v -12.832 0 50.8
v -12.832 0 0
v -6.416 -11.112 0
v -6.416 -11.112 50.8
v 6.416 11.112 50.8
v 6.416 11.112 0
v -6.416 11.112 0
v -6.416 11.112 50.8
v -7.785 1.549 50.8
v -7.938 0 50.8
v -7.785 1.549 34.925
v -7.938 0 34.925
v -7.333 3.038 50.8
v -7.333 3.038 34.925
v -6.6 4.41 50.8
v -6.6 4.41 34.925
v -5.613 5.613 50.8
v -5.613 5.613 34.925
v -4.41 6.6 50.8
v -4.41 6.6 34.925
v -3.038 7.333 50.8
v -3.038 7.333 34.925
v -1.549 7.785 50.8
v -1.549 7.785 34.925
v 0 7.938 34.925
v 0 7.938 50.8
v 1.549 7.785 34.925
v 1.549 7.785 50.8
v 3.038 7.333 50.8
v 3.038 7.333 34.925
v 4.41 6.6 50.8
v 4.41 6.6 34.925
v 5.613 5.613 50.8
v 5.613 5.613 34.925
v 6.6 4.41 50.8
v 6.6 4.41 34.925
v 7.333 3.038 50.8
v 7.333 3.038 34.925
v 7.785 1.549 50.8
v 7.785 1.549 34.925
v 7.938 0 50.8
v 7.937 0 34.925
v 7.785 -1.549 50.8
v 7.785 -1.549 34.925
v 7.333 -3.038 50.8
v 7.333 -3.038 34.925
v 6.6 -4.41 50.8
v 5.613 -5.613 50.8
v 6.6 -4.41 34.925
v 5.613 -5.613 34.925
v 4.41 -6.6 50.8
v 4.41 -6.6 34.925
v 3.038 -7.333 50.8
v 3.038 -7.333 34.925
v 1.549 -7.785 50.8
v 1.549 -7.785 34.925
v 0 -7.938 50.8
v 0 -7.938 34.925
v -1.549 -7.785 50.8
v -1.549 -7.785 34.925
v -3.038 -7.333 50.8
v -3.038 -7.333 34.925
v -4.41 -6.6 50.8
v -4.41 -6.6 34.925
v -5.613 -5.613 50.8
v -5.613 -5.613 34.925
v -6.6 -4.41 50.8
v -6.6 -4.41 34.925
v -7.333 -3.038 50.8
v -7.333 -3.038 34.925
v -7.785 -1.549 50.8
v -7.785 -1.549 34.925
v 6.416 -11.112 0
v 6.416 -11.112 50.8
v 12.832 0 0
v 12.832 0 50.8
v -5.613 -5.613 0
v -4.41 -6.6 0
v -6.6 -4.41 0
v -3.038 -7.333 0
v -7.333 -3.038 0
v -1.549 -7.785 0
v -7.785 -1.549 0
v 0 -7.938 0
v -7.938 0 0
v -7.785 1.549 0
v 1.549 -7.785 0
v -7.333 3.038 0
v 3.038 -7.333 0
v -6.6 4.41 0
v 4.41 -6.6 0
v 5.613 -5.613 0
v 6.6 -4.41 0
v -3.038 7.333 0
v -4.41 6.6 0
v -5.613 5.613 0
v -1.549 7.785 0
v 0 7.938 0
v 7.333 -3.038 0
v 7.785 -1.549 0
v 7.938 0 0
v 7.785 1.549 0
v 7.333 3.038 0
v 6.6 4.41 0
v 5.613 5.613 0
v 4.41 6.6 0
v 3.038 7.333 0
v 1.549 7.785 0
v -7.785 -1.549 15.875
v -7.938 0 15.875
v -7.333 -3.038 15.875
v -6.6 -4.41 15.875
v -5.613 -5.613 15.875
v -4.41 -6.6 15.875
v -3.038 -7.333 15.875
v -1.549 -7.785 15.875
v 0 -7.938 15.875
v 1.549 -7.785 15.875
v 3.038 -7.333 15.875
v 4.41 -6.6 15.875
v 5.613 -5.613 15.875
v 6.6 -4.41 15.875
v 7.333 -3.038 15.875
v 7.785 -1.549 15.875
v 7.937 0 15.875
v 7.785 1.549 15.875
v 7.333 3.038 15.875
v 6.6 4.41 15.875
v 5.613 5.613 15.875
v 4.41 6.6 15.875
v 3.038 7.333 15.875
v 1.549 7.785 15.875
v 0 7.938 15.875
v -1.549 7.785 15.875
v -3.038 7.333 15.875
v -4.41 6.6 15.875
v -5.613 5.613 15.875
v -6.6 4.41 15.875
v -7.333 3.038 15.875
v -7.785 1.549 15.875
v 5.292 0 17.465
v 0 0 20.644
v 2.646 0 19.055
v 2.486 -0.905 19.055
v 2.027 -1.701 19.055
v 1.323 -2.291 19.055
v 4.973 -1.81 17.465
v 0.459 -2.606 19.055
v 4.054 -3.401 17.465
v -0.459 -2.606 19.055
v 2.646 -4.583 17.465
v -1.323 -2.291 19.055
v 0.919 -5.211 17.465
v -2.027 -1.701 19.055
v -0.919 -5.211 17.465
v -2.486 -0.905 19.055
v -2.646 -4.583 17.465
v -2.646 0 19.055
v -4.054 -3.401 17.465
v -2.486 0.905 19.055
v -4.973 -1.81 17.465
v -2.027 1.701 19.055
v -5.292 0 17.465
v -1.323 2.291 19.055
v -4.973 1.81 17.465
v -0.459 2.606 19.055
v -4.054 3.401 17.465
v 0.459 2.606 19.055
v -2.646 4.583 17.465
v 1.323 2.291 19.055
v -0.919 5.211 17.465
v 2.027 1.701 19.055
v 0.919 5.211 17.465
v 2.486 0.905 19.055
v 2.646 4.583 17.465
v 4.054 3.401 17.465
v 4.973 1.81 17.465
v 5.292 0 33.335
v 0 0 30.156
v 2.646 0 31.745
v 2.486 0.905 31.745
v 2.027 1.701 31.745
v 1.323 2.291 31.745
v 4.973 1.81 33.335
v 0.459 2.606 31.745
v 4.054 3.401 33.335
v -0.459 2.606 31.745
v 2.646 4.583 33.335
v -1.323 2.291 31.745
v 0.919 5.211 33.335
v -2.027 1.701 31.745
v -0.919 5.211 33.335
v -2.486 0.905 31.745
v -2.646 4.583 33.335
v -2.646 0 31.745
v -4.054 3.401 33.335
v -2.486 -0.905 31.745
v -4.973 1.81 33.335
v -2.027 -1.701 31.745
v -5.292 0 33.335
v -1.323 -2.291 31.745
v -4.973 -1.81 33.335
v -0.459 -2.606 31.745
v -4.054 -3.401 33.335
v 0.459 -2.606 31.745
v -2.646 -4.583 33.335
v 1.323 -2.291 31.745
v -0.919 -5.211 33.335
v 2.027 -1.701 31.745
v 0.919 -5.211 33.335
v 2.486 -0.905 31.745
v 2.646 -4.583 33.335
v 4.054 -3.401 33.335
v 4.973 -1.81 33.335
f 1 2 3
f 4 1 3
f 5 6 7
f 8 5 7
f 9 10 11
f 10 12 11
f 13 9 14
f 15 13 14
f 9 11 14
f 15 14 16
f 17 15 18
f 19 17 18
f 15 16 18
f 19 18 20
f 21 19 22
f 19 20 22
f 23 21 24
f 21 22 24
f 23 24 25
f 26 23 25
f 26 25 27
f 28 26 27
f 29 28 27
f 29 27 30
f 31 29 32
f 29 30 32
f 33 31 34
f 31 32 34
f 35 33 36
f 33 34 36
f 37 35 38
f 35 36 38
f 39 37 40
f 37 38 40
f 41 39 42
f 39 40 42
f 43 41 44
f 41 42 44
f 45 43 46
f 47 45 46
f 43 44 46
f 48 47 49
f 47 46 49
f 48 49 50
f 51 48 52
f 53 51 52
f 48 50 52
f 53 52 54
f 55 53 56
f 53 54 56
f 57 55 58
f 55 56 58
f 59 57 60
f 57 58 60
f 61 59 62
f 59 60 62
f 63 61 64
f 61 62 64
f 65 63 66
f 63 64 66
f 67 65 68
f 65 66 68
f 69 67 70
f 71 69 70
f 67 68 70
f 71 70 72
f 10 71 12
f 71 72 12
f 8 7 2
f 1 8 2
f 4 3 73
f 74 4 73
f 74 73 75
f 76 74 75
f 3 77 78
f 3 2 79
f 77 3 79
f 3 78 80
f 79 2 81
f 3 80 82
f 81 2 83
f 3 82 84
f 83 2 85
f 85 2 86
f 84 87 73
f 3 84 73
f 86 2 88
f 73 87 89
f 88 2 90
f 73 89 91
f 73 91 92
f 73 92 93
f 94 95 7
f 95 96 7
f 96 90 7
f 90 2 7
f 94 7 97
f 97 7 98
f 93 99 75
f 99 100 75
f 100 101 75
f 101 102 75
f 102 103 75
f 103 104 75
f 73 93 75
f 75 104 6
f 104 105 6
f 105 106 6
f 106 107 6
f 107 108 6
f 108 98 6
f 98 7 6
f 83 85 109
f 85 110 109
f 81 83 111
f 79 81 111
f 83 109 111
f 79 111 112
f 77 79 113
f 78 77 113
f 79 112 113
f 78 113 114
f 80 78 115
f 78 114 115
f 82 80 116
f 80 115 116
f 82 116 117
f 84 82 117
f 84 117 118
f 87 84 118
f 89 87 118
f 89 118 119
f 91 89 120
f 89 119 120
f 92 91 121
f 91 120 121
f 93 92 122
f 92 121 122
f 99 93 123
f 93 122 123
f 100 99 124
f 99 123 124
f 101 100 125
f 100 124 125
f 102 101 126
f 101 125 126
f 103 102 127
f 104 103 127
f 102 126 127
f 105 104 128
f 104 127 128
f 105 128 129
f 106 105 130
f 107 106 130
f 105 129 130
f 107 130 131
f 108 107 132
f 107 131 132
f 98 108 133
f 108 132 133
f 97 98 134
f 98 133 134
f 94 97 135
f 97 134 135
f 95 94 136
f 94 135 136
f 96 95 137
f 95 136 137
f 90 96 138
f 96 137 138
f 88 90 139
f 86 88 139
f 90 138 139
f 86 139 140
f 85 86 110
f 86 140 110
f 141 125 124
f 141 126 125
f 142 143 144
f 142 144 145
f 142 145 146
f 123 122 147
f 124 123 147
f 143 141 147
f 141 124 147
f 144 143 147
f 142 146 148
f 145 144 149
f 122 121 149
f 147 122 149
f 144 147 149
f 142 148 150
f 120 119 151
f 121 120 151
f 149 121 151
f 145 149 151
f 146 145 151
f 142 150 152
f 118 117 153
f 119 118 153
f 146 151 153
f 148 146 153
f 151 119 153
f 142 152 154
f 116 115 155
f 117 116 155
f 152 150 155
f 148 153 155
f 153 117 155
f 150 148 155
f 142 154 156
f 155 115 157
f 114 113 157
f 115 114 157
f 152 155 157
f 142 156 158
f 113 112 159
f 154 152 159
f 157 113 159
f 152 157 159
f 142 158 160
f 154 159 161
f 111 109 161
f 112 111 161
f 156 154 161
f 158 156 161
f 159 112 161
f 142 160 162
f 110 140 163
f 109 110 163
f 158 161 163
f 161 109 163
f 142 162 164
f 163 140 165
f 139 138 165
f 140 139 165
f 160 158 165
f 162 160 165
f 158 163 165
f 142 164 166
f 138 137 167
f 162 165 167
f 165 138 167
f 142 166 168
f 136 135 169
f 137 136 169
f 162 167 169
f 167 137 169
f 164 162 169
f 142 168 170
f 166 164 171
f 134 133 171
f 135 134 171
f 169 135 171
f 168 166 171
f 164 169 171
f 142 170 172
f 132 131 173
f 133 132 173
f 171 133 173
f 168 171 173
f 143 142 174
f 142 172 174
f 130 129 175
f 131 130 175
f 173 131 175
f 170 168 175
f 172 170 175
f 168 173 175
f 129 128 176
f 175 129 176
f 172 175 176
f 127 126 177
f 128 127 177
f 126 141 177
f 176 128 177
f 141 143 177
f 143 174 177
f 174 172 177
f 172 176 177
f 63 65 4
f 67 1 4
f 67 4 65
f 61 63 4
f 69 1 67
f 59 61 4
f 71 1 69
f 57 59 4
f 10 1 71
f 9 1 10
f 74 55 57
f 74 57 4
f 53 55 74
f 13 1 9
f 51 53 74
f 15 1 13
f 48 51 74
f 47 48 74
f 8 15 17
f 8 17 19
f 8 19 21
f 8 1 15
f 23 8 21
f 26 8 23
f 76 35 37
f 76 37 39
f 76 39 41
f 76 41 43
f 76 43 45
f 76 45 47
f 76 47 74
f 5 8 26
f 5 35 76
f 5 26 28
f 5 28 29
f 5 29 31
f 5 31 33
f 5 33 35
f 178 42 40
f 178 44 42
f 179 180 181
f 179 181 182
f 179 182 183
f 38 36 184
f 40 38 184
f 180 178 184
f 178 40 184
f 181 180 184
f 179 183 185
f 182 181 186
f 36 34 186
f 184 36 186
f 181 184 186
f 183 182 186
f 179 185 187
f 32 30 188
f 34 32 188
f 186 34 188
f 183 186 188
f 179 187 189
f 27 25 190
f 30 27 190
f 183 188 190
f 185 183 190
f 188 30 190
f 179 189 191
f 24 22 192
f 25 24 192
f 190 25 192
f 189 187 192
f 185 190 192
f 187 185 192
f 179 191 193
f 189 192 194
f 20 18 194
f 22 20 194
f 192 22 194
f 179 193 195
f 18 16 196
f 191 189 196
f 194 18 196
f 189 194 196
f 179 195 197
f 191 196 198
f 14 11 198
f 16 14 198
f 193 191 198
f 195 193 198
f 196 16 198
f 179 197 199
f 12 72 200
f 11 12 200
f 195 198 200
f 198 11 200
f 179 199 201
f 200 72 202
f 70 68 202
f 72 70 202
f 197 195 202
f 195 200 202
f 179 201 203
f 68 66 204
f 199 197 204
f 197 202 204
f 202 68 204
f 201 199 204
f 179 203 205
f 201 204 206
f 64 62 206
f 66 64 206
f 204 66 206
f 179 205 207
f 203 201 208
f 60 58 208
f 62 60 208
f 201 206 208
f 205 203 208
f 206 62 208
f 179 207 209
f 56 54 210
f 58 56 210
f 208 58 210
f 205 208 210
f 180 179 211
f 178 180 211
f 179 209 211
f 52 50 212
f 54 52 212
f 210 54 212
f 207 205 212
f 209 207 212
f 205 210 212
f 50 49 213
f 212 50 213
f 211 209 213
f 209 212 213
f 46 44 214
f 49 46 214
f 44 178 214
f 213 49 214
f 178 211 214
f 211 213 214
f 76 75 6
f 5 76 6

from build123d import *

# Parameters (mm, degrees)
F1_DEPTH = 50.8
F2_D     = 15.875
F2_DEPTH = 15.875
F2_TIP   = 4.7693311635
F4_D     = 15.875
F4_DEPTH = 15.875
F4_TIP   = 4.7693311635


with BuildPart() as f1:
    # F0 (on Top) → F1 (new body)
    with BuildSketch(Plane.XY):
        Polygon((6.4158048664, 11.1125), (-6.4158048664, 11.1125), (-12.8316097327, 0), (-6.4158048664, -11.1125), (6.4158048664, -11.1125), (12.8316097327, 0), align=None)
    extrude(amount=F1_DEPTH)

    # F2
    with Locations(Plane(origin=(0, 0, 0), x_dir=(1, 0, 0), z_dir=(0, 0, -1))):
        with Locations((0, 0)):
            Hole(F2_D / 2, depth=F2_DEPTH)
            with Locations((0, 0, -(F2_DEPTH + F2_TIP / 2))):  # 118° drill point
                Cone(0, F2_D / 2, F2_TIP, mode=Mode.SUBTRACT)

    # F4
    with Locations(Plane.XY.offset(50.8)):
        with Locations((0, 0)):
            Hole(F4_D / 2, depth=F4_DEPTH)
            with Locations((0, 0, -(F4_DEPTH + F4_TIP / 2))):  # 118° drill point
                Cone(0, F4_D / 2, F4_TIP, mode=Mode.SUBTRACT)


solid = f1.part
